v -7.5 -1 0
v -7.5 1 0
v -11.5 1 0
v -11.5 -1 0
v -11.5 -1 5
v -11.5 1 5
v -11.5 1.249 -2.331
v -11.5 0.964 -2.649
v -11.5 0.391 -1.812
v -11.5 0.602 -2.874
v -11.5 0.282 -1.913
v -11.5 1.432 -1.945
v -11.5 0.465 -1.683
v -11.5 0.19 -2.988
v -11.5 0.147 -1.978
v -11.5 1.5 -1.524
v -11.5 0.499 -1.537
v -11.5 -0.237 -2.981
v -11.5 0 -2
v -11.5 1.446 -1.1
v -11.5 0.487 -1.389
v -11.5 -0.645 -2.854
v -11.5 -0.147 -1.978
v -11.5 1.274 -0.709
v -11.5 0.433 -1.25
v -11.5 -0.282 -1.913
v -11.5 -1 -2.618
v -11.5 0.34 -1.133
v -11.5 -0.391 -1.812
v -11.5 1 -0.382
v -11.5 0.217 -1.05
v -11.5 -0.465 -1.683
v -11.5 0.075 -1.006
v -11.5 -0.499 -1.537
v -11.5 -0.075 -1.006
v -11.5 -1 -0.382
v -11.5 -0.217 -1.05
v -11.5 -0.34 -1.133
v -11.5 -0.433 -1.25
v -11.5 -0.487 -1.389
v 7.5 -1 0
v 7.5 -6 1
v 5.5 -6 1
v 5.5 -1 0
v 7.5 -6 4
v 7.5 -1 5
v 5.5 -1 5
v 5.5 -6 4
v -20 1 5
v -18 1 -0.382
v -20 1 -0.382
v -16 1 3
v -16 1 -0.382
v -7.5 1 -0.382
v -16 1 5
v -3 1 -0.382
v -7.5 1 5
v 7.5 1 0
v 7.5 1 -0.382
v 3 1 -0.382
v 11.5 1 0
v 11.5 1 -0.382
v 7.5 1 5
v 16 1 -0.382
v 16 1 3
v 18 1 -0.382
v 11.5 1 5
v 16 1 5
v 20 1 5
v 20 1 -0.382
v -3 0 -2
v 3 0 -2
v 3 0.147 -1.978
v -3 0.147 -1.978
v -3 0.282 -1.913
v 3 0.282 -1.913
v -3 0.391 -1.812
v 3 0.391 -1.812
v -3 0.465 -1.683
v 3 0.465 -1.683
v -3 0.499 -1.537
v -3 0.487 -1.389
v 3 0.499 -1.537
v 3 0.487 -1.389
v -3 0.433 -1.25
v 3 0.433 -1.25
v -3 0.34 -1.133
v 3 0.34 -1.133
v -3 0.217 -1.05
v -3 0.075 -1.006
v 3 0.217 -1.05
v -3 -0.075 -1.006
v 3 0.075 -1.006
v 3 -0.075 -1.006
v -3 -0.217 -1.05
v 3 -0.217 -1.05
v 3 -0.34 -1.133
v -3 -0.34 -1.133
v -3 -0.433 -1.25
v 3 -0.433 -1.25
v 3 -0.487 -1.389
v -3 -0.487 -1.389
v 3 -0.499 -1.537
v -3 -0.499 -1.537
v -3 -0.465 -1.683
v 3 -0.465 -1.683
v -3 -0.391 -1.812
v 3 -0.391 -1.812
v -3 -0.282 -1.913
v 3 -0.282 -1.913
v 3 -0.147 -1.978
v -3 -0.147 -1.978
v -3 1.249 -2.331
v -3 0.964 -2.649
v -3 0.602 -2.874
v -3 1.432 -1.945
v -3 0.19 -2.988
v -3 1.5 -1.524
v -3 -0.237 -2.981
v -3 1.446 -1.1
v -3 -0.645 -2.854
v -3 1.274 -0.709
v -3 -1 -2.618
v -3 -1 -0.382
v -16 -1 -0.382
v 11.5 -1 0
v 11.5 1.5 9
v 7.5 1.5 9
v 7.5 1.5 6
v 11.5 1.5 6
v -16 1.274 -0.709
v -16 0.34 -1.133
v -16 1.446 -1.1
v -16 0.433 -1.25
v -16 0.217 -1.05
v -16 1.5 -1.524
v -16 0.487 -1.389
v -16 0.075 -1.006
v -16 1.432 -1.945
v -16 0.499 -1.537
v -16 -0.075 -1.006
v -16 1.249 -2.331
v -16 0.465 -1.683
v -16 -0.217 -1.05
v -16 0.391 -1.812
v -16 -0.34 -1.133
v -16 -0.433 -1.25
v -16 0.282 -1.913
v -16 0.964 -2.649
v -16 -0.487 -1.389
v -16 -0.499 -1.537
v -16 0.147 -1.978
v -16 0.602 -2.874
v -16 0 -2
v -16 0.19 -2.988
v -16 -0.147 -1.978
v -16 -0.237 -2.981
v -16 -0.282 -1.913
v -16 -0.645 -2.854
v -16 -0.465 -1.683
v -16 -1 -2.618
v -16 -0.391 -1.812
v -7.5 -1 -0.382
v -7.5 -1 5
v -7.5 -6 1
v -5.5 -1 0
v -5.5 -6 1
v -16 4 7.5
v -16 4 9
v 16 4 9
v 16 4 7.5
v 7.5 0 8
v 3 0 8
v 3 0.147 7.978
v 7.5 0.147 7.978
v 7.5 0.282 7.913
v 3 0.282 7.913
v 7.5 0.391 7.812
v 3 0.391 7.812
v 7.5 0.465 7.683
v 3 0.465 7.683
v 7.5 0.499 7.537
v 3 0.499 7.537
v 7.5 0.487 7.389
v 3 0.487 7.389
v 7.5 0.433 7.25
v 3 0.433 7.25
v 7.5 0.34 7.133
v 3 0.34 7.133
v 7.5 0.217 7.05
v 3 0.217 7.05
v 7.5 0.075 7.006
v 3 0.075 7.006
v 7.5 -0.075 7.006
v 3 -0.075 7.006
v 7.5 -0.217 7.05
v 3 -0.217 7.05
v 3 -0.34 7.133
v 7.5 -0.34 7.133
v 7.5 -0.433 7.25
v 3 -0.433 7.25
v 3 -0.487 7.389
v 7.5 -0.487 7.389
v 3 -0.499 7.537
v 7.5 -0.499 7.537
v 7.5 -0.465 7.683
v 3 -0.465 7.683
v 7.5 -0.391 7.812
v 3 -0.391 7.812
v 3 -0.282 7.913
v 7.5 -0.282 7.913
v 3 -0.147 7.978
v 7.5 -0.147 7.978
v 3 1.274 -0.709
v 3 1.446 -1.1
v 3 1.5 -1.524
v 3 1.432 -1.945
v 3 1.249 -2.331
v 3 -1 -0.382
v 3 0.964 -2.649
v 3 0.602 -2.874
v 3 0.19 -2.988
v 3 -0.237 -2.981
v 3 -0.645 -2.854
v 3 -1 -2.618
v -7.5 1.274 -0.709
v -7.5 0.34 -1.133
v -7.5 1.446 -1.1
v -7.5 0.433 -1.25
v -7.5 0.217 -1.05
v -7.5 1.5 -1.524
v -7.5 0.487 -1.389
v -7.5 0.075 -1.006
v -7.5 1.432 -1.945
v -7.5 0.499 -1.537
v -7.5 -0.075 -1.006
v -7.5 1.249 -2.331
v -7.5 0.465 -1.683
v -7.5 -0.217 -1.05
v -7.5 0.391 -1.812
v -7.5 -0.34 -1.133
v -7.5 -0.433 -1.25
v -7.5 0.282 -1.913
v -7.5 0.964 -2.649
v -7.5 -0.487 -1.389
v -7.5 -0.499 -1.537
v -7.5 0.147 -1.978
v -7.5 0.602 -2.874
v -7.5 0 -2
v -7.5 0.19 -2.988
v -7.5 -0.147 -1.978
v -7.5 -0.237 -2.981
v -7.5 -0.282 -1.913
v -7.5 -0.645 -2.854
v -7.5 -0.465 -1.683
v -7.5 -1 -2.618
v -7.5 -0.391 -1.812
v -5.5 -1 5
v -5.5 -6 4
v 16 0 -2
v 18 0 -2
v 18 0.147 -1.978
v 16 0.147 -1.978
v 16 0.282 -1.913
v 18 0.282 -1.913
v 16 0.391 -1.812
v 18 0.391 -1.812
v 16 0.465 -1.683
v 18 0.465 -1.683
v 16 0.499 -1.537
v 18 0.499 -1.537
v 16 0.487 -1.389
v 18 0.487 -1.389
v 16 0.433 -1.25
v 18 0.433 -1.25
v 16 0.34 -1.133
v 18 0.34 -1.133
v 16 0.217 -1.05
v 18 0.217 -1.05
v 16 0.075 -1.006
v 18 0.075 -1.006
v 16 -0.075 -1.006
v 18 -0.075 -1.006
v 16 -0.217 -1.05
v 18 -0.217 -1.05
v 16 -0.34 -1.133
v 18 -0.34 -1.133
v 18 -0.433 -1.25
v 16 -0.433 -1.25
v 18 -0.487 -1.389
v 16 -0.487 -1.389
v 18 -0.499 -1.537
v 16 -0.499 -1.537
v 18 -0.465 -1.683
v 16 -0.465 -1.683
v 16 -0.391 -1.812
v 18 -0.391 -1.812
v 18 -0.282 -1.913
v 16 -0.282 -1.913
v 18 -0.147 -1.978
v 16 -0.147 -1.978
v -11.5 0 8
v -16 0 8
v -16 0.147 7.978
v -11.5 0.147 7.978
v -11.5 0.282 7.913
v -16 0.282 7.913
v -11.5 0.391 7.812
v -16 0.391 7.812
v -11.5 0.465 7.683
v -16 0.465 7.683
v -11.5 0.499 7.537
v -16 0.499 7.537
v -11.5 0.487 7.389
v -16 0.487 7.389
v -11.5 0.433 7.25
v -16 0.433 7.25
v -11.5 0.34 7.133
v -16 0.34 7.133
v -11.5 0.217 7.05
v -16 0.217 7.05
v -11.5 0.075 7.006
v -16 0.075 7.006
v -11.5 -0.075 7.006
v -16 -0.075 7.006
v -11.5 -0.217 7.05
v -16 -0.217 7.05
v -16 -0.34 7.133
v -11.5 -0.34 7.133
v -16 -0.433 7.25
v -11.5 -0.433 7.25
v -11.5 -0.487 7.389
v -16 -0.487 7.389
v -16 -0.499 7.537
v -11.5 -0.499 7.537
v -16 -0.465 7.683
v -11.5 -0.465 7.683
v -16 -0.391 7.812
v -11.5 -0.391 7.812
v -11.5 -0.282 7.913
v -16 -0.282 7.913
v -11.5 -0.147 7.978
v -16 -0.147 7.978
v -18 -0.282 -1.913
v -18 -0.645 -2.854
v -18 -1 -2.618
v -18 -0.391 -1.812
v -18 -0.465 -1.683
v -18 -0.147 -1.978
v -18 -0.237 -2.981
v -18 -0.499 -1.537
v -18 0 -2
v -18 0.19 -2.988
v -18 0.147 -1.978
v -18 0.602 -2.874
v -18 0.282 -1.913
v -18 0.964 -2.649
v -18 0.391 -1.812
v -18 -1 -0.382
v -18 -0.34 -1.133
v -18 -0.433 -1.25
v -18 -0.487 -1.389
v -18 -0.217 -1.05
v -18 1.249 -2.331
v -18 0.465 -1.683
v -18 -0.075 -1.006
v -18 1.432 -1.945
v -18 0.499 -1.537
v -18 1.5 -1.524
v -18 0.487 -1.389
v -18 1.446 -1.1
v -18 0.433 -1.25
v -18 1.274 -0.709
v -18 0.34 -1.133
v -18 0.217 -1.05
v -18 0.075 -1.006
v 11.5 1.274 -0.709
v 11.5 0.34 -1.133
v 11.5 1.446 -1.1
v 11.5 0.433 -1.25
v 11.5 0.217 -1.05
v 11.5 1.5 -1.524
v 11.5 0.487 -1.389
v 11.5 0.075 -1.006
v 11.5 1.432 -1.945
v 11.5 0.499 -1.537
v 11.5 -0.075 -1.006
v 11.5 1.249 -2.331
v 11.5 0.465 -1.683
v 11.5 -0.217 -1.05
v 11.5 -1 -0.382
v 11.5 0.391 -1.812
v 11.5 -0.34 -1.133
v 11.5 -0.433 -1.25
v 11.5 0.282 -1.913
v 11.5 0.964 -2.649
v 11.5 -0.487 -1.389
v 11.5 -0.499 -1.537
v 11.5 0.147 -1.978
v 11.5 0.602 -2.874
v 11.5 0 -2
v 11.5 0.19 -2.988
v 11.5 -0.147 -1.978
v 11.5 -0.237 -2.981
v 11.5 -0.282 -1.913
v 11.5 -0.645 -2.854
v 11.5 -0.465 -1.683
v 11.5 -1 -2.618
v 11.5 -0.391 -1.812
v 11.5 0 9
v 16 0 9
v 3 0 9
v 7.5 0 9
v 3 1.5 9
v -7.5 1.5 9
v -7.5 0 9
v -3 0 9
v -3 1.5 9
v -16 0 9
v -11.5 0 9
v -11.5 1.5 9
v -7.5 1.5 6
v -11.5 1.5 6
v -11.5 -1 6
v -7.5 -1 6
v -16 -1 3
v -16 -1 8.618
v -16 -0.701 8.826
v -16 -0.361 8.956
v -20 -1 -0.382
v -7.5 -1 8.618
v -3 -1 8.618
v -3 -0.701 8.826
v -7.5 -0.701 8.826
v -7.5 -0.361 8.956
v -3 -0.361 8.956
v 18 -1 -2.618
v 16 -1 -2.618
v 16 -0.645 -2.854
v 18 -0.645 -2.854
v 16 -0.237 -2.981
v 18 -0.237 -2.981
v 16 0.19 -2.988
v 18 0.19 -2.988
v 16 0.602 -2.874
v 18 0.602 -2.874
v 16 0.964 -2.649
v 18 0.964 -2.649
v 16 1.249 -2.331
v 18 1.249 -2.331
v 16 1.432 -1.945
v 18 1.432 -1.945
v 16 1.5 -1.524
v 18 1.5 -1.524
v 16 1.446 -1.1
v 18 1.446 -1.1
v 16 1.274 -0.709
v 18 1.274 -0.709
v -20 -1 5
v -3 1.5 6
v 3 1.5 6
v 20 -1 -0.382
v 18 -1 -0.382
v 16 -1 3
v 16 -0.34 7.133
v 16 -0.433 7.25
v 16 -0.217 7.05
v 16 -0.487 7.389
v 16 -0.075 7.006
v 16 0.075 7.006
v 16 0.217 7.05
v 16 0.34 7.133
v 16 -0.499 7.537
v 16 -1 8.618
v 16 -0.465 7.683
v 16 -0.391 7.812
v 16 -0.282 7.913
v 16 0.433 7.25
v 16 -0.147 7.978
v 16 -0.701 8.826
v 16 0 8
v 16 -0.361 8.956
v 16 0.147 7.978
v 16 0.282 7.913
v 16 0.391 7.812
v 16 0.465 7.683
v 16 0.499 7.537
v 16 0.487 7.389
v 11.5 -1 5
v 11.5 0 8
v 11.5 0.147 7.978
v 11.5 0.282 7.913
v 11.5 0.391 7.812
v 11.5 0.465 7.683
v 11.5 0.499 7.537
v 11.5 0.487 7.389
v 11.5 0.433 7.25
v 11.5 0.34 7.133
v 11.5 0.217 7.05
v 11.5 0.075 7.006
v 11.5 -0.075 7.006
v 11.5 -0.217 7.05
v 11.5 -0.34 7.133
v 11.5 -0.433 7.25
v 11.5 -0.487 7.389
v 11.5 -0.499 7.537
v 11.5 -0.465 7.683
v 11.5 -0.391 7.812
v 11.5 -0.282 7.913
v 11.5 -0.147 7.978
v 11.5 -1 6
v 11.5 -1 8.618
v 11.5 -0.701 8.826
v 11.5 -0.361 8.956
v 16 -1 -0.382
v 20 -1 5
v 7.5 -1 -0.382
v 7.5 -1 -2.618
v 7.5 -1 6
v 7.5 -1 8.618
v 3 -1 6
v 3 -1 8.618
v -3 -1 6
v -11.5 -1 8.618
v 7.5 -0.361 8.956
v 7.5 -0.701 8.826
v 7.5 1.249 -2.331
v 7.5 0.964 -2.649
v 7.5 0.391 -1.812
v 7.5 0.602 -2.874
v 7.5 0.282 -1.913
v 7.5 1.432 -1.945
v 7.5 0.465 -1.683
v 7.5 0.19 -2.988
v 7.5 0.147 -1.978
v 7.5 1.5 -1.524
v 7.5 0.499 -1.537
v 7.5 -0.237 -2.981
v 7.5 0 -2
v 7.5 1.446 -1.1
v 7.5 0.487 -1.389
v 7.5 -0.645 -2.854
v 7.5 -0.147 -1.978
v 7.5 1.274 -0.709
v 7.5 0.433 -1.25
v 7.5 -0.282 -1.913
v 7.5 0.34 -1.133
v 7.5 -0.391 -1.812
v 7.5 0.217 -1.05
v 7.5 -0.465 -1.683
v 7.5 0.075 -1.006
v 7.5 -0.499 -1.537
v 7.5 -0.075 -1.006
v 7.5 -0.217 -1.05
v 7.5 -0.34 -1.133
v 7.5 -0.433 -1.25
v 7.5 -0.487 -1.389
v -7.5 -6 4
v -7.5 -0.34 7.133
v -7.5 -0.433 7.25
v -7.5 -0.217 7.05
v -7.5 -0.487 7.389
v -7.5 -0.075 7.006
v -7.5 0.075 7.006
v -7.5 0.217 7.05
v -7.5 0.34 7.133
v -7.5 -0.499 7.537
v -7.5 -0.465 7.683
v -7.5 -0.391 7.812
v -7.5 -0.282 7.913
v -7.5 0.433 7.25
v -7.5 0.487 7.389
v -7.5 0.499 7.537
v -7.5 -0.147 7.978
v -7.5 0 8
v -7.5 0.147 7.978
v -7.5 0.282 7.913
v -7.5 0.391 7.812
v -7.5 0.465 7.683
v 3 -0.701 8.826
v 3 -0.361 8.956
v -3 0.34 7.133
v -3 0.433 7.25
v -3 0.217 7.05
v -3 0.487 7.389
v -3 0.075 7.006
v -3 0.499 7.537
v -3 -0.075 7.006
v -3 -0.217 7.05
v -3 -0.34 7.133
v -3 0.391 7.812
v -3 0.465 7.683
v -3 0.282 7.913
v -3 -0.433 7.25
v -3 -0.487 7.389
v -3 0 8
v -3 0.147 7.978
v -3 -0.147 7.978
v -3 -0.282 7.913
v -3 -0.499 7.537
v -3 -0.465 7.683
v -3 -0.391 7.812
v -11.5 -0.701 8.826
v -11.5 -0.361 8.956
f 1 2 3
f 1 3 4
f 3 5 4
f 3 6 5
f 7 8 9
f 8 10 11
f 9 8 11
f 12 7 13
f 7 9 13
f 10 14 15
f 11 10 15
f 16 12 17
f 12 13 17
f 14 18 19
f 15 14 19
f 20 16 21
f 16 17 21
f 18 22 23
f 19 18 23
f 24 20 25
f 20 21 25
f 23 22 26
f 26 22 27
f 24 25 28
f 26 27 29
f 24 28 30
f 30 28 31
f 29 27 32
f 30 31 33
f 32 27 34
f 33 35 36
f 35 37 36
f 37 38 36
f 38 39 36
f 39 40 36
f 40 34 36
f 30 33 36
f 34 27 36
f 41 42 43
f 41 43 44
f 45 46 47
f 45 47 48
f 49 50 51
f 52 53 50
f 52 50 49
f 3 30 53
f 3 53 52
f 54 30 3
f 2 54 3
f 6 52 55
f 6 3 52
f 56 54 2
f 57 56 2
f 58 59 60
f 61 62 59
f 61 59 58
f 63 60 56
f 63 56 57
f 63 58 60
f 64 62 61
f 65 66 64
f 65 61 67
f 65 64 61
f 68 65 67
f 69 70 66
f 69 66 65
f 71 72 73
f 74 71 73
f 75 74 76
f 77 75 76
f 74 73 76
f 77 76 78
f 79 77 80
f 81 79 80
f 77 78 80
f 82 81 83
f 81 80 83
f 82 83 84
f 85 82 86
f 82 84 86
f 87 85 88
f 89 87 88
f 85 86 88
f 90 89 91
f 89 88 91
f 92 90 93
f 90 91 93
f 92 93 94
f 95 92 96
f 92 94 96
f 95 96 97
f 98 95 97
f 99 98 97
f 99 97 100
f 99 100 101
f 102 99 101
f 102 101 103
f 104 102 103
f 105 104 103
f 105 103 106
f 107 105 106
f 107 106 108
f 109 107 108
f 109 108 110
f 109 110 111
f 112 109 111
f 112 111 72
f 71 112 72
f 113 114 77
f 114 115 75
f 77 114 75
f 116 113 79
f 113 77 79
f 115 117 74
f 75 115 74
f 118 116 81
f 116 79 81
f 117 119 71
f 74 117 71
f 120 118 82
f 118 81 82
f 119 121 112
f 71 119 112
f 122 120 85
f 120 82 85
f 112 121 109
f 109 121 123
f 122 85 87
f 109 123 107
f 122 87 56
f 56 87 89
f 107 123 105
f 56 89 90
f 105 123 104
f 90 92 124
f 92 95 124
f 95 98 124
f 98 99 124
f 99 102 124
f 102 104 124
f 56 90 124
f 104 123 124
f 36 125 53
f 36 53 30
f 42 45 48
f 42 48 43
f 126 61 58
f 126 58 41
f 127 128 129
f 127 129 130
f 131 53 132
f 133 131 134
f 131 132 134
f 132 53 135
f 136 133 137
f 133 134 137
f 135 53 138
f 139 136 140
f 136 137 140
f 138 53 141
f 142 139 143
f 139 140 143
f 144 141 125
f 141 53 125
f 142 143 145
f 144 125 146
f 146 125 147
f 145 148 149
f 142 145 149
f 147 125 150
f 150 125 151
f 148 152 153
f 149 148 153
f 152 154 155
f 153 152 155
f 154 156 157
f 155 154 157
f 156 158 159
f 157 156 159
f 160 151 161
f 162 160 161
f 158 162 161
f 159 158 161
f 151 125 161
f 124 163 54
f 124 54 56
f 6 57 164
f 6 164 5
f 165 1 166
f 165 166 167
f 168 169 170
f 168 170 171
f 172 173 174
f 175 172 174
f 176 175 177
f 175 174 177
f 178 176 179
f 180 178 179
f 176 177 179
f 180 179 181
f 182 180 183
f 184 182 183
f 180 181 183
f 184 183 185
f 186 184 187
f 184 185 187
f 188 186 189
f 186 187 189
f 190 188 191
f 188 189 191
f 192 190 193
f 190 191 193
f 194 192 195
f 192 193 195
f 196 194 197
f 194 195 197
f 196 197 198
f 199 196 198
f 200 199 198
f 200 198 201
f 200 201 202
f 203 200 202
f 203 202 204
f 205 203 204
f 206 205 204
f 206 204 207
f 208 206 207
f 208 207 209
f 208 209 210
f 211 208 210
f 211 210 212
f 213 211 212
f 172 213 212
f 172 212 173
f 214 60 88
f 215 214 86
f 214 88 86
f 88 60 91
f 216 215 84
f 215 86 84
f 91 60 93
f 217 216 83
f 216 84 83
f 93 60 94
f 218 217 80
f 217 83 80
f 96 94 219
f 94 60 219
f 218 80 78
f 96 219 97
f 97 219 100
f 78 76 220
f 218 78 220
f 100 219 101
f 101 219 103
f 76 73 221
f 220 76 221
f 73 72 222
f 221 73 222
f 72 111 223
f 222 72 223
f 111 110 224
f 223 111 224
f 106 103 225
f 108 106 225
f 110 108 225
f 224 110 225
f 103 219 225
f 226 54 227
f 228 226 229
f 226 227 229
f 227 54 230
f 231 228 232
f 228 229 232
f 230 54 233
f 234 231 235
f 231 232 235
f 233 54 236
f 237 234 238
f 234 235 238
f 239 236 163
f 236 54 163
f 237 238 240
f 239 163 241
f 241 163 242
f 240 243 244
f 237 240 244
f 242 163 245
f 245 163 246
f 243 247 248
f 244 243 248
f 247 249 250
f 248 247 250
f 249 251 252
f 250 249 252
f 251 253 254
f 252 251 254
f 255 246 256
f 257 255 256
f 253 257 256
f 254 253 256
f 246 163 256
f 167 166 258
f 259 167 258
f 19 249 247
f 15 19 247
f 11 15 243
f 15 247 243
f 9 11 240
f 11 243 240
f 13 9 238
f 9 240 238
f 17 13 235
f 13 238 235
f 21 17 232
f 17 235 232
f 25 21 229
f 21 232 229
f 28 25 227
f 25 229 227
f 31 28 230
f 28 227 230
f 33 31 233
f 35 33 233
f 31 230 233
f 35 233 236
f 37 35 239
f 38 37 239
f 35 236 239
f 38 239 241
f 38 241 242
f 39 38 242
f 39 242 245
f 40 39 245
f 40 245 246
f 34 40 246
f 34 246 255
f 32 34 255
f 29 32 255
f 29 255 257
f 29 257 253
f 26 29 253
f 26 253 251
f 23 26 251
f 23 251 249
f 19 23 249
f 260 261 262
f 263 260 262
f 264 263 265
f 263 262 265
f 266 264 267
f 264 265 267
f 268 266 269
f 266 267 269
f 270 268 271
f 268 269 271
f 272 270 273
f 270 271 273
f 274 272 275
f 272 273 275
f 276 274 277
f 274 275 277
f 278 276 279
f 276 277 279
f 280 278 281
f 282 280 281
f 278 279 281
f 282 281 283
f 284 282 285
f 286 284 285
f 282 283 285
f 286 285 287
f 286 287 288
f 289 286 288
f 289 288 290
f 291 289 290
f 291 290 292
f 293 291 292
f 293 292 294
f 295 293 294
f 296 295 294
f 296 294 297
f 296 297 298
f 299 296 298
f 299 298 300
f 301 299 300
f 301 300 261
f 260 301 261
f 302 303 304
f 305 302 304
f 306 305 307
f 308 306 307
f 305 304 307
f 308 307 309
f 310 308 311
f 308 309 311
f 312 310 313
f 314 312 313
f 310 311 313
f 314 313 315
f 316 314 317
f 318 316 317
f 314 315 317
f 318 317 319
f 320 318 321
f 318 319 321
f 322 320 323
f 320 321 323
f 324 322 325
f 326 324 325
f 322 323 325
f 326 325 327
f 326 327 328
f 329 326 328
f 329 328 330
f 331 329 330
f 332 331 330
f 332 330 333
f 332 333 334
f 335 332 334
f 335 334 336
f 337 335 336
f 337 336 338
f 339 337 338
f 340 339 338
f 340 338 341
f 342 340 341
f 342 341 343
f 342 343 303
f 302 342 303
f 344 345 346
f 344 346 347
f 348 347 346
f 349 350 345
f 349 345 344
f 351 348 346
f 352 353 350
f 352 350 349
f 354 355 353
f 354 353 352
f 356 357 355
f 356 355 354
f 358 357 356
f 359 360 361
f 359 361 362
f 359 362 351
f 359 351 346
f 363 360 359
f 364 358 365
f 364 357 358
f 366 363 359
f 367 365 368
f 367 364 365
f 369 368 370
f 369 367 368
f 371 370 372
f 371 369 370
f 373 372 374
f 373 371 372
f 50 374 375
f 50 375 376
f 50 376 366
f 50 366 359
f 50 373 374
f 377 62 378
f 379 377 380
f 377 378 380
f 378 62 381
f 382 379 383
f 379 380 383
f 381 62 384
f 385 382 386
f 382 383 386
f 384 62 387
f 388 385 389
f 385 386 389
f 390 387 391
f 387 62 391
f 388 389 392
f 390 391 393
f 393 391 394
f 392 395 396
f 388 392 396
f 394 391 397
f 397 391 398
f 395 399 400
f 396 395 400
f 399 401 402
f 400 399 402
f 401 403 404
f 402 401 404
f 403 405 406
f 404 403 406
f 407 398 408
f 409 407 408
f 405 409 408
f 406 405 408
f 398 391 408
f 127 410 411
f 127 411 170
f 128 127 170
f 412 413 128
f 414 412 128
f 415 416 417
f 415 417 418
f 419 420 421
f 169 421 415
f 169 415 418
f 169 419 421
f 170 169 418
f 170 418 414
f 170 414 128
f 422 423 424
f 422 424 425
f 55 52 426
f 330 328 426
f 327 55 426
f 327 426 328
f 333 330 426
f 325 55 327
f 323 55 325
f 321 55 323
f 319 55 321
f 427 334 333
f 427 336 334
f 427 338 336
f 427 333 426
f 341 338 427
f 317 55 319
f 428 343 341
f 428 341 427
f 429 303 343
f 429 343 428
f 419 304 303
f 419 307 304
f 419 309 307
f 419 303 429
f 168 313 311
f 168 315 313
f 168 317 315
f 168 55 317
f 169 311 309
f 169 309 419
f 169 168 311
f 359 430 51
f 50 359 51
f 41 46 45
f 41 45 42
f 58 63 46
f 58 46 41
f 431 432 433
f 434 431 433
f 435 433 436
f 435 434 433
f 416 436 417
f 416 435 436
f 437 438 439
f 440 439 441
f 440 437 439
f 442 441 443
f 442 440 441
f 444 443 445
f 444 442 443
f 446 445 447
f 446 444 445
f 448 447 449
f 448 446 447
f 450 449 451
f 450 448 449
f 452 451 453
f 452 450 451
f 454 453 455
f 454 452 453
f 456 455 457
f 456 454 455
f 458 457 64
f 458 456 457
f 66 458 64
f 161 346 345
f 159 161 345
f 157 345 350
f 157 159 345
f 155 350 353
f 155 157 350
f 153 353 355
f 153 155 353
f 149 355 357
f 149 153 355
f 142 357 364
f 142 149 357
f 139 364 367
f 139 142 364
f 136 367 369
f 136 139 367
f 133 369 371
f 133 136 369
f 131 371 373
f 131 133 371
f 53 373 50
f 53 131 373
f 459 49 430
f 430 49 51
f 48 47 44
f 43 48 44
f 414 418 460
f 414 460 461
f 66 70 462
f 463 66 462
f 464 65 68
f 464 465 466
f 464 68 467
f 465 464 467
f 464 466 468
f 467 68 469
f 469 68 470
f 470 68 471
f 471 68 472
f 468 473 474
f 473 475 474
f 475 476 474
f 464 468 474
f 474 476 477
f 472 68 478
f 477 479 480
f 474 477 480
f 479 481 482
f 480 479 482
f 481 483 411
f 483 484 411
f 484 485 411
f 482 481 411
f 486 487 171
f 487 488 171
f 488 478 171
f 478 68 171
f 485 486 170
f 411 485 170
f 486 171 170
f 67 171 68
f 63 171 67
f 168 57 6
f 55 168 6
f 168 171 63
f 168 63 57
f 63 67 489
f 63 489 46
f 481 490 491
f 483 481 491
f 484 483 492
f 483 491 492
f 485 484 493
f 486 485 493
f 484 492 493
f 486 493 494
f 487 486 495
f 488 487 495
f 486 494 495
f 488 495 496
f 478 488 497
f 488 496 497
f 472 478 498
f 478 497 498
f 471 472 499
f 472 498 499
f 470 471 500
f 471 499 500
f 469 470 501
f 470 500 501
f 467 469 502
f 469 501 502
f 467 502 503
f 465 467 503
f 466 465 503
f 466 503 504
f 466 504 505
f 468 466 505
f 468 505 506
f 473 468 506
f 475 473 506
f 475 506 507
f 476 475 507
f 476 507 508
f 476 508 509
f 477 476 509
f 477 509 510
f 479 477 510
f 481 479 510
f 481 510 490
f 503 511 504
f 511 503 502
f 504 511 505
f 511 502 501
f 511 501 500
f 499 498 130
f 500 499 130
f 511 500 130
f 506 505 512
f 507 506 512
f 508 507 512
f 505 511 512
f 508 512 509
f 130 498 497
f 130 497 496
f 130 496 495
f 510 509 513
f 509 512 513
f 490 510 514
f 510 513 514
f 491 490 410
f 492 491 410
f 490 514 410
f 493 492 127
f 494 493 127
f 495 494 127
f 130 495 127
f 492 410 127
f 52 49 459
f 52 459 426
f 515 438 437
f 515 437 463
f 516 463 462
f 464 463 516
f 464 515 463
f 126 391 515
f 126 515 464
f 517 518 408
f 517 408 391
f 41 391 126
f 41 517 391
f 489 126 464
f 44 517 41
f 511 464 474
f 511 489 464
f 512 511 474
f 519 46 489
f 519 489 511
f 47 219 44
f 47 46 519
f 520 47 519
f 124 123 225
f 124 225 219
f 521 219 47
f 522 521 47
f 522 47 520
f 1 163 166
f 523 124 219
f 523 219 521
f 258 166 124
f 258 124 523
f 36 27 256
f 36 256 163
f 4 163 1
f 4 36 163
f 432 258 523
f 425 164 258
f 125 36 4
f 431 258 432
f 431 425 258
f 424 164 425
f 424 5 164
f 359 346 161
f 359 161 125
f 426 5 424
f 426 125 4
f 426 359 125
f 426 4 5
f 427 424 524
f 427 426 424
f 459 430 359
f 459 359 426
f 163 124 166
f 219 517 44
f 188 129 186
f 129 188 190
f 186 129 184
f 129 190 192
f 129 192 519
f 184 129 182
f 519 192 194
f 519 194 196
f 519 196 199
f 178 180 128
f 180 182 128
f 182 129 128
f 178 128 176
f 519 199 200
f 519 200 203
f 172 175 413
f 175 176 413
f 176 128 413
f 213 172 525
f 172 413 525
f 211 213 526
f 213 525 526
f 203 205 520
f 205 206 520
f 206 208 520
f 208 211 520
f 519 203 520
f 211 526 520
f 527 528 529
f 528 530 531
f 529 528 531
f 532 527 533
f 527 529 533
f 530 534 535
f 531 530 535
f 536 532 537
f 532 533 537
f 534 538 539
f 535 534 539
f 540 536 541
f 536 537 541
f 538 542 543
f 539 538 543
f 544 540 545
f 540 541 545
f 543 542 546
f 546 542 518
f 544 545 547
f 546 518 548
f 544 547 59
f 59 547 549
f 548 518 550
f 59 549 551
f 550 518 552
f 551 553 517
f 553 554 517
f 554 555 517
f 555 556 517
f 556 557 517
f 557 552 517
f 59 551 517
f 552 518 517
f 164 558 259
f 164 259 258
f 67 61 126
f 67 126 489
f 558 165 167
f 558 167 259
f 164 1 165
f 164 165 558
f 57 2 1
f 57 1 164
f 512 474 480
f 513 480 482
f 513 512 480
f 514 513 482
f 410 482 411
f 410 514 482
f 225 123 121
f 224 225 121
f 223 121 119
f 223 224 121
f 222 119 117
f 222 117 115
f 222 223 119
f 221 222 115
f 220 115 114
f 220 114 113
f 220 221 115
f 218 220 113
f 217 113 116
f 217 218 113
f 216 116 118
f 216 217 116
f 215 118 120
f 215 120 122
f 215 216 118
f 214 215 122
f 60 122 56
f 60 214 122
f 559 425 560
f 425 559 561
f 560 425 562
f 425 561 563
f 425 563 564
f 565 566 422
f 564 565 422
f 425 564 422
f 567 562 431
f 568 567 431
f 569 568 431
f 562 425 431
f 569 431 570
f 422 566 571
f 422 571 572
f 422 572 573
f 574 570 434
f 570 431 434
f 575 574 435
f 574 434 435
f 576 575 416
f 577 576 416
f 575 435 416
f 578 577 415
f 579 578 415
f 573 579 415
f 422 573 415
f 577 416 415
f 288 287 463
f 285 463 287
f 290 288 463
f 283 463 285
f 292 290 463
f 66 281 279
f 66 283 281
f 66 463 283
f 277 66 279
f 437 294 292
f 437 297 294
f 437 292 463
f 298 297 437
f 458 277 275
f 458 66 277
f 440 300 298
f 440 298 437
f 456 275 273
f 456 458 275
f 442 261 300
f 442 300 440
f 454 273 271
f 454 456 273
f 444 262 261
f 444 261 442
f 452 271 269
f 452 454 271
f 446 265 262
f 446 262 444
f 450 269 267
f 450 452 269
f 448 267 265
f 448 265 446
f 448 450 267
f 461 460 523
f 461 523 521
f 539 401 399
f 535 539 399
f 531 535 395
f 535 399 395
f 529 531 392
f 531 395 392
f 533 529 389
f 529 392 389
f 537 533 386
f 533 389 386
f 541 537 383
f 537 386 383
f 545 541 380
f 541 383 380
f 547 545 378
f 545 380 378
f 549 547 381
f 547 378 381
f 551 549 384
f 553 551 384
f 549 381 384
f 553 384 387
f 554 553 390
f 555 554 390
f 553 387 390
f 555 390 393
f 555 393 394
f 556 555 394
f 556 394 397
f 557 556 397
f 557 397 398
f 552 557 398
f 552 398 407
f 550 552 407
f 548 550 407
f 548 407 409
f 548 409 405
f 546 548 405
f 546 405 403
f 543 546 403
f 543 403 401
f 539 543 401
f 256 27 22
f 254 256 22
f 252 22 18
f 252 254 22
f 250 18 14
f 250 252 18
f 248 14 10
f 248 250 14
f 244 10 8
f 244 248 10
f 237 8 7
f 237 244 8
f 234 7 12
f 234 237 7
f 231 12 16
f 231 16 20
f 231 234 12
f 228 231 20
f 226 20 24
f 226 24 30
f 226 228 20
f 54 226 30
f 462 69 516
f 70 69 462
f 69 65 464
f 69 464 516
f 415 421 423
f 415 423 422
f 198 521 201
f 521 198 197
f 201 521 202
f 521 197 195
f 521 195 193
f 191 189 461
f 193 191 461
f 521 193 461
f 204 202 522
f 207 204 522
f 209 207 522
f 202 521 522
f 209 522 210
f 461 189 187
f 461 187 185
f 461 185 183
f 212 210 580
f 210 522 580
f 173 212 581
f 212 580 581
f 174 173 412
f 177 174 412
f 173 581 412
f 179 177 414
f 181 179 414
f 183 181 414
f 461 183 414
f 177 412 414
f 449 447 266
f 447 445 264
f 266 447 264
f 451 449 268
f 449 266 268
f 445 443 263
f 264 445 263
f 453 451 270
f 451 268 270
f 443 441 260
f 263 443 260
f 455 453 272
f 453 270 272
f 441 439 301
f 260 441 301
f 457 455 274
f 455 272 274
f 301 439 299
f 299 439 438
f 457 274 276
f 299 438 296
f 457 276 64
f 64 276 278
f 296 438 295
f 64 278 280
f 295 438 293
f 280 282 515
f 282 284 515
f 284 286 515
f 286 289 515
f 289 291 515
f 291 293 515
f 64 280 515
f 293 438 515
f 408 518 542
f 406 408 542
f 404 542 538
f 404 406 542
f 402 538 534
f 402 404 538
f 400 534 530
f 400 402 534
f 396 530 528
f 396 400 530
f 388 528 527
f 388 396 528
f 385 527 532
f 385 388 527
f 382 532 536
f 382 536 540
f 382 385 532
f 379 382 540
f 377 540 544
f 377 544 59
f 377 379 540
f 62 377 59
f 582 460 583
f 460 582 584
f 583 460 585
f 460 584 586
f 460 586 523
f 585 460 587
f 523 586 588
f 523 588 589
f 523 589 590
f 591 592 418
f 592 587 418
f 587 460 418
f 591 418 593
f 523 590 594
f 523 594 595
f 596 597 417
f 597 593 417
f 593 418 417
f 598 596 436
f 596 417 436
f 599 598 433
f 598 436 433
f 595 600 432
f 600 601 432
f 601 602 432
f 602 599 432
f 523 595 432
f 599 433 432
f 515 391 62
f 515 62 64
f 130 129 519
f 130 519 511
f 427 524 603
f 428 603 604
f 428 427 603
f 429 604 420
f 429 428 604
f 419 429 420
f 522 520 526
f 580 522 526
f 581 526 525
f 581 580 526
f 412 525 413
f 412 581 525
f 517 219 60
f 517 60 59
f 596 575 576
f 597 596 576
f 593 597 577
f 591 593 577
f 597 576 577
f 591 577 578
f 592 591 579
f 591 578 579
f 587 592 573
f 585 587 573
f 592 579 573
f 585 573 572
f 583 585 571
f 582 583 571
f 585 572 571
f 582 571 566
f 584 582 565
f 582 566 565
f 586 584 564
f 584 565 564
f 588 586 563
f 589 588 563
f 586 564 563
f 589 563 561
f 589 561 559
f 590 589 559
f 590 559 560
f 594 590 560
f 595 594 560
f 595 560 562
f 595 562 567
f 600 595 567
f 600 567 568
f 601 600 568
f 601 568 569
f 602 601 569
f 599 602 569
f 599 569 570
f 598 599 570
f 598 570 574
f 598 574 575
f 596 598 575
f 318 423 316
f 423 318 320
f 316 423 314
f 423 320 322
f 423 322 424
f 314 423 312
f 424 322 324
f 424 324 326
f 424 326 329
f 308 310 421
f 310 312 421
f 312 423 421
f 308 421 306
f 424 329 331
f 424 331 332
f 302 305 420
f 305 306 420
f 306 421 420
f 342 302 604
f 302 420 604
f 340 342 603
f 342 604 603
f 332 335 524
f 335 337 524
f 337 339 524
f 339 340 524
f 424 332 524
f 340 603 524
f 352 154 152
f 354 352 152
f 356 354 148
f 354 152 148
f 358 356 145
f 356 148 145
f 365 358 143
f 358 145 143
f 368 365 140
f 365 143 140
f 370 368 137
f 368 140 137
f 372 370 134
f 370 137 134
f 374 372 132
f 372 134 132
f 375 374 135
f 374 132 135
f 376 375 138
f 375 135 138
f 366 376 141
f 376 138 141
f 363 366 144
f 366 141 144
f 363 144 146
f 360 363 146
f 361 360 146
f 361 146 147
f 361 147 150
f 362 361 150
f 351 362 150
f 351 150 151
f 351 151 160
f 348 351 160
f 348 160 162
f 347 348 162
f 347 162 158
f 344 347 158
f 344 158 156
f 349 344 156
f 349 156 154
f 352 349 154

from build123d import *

# Parameters (mm, degrees)
SALIENTE_EXTRUIR1_DEPTH      = 1
SALIENTE_EXTRUIR1_DEPTH_BACK = 1
CROQUIS2_R                   = 0.5
SALIENTE_EXTRUIR2_DEPTH      = 40
CORTAR_EXTRUIR1_DEPTH        = 40
CROQUIS6_R                   = 0.5
CORTAR_EXTRUIR2_DEPTH        = 2
CORTAR_EXTRUIR3_START        = -2
CROQUIS7_R                   = 0.5
CORTAR_EXTRUIR3_DEPTH        = 2
CROQUIS9_R                   = 0.5
SALIENTE_EXTRUIR3_DEPTH      = 32
CORTAR_EXTRUIR4_DEPTH        = 36
CROQUIS11_W                  = 4.5
CROQUIS11_H                  = 2.618033989
CORTAR_EXTRUIR5_DEPTH        = 36
CROQUIS14_W                  = 4
CROQUIS14_H                  = 2.5
CROQUIS14_W_2                = 6
CORTAR_EXTRUIR6_DEPTH        = 3
SALIENTE_EXTRUIR4_DEPTH      = 2
SALIENTE_EXTRUIR5_DEPTH      = 2


with BuildPart() as part:
    # Croquis1 → Saliente-Extruir1 (new, two sides: drawn at the far end of the back side and taken through both)
    with BuildSketch(Plane(origin=(0, 0, 0), x_dir=(1, 0, 0), z_dir=(0, 1, 0)).offset(-SALIENTE_EXTRUIR1_DEPTH_BACK)):
        Polygon((-20, 0), (-20, -5), (-16, -3), (-16, -6), (16, -6), (16, -3), (20, -5), (20, 0), (11.5, 0), (11.5, -5), (7.5, -5), (7.5, 0), (-7.5, 0), (-7.5, -5), (-11.5, -5), (-11.5, 0), align=None)
    extrude(amount=SALIENTE_EXTRUIR1_DEPTH + SALIENTE_EXTRUIR1_DEPTH_BACK)

    # Croquis2 → Saliente-Extruir2 (add)
    with BuildSketch(Plane(origin=(20, 0, 0), x_dir=(0, 0, -1), z_dir=(1, 0, 0))):
        with BuildLine():
            Line((0, -1), (0.381966011, -1))
            ThreePointArc((0.381966011, -1), (3, 0), (0.381966011, 1))
            Line((0.381966011, 1), (0, 1))
            Line((0, 1), (0, 0))
            Line((0, 0), (0, -1))
        make_face()
        with Locations((1.5, 0)):
            Circle(CROQUIS2_R, mode=Mode.SUBTRACT)
    extrude(amount=-SALIENTE_EXTRUIR2_DEPTH)

    # Croquis5 → Cortar-Extruir1 (cut)
    with BuildSketch(Plane(origin=(20, 0, 0), x_dir=(0, 0, -1), z_dir=(1, 0, 0))):
        with BuildLine():
            Line((2.618033989, -1), (0.381966011, -1))
            ThreePointArc((0.381966011, -1), (1.5, -1.5), (2.618033989, -1))
        make_face()
    extrude(amount=-CORTAR_EXTRUIR1_DEPTH, mode=Mode.SUBTRACT)

    # Croquis6 → Cortar-Extruir2 (cut)
    with BuildSketch(Plane(origin=(20, 0, 0), x_dir=(0, 0, -1), z_dir=(1, 0, 0))):
        with BuildLine():
            ThreePointArc((2.618033989, -1), (2.5, 1.118033989), (0.381966011, 1))
            Line((0.381966011, 1), (0.381966011, -1))
            Line((0.381966011, -1), (2.618033989, -1))
        make_face()
        with Locations((1.5, 0)):
            Circle(CROQUIS6_R, mode=Mode.SUBTRACT)
    extrude(amount=-CORTAR_EXTRUIR2_DEPTH, mode=Mode.SUBTRACT)

    # Croquis7 → Cortar-Extruir3 (cut)
    with BuildSketch(Plane.ZY.offset(20).offset(CORTAR_EXTRUIR3_START)):
        with BuildLine():
            Line((-0.381966011, -1), (-0.381966011, 1))
            ThreePointArc((-0.381966011, 1), (-2.5, 1.118033989), (-2.618033989, -1))
            Line((-2.618033989, -1), (-0.381966011, -1))
        make_face()
        with Locations((-1.5, 0)):
            Circle(CROQUIS7_R, mode=Mode.SUBTRACT)
    extrude(amount=CORTAR_EXTRUIR3_DEPTH, mode=Mode.SUBTRACT)

    # Croquis9 → Saliente-Extruir3 (add)
    with BuildSketch(Plane.ZY.offset(16)):
        with BuildLine():
            Line((6, -1), (6.381966011, -1))
            ThreePointArc((6.381966011, -1), (8.035233135, -1.401258538), (9, 0))
            Line((9, 0), (9, 4))
            Line((9, 4), (7.5, 4))
            Line((7.5, 4), (5, 1))
            Line((5, 1), (6, 1))
            Line((6, 1), (6, 0))
            Line((6, 0), (6, -1))
        make_face()
        with Locations((7.5, 0)):
            Circle(CROQUIS9_R, mode=Mode.SUBTRACT)
    extrude(amount=-SALIENTE_EXTRUIR3_DEPTH)

    # Croquis10 → Cortar-Extruir4 (cut)
    with BuildSketch(Plane.ZY.offset(16)):
        with BuildLine():
            Line((8.618033989, -1), (6.381966011, -1))
            ThreePointArc((6.381966011, -1), (7.5, -1.5), (8.618033989, -1))
        make_face()
    extrude(amount=-CORTAR_EXTRUIR4_DEPTH, mode=Mode.SUBTRACT)

    # Croquis11 → Cortar-Extruir5 (cut)
    with BuildSketch(Plane.XZ.offset(1)):
        with Locations((-13.75, -1.690983006)):
            Rectangle(CROQUIS11_W, CROQUIS11_H)
        with Locations((5.25, -1.690983006)):
            Rectangle(CROQUIS11_W, CROQUIS11_H)
        with Locations((-5.25, -1.690983006)):
            Rectangle(CROQUIS11_W, CROQUIS11_H)
        with Locations((13.75, -1.690983006)):
            Rectangle(CROQUIS11_W, CROQUIS11_H)
    extrude(amount=-CORTAR_EXTRUIR5_DEPTH, mode=Mode.SUBTRACT)

    # Croquis14 → Cortar-Extruir6 (cut)
    with BuildSketch(Plane.XY.offset(9)):
        with Locations((9.5, 0.25)):
            Rectangle(CROQUIS14_W, CROQUIS14_H)
        with Locations((0, 0.25)):
            Rectangle(CROQUIS14_W_2, CROQUIS14_H)
        with Locations((-9.5, 0.25)):
            Rectangle(CROQUIS14_W, CROQUIS14_H)
    extrude(amount=-CORTAR_EXTRUIR6_DEPTH, mode=Mode.SUBTRACT)

    # Croquis15 → Saliente-Extruir4 (add)
    with BuildSketch(Plane.ZY.offset(7.5)):
        Polygon((5, -1), (0, -1), (1, -6), (4, -6), align=None)
    extrude(amount=-SALIENTE_EXTRUIR4_DEPTH)

    # Croquis16 → Saliente-Extruir5 (add)
    with BuildSketch(Plane(origin=(7.5, 0, 0), x_dir=(0, 0, -1), z_dir=(1, 0, 0))):
        Polygon((0, -1), (-5, -1), (-4, -6), (-1, -6), align=None)
    extrude(amount=-SALIENTE_EXTRUIR5_DEPTH)


solid = part.part
